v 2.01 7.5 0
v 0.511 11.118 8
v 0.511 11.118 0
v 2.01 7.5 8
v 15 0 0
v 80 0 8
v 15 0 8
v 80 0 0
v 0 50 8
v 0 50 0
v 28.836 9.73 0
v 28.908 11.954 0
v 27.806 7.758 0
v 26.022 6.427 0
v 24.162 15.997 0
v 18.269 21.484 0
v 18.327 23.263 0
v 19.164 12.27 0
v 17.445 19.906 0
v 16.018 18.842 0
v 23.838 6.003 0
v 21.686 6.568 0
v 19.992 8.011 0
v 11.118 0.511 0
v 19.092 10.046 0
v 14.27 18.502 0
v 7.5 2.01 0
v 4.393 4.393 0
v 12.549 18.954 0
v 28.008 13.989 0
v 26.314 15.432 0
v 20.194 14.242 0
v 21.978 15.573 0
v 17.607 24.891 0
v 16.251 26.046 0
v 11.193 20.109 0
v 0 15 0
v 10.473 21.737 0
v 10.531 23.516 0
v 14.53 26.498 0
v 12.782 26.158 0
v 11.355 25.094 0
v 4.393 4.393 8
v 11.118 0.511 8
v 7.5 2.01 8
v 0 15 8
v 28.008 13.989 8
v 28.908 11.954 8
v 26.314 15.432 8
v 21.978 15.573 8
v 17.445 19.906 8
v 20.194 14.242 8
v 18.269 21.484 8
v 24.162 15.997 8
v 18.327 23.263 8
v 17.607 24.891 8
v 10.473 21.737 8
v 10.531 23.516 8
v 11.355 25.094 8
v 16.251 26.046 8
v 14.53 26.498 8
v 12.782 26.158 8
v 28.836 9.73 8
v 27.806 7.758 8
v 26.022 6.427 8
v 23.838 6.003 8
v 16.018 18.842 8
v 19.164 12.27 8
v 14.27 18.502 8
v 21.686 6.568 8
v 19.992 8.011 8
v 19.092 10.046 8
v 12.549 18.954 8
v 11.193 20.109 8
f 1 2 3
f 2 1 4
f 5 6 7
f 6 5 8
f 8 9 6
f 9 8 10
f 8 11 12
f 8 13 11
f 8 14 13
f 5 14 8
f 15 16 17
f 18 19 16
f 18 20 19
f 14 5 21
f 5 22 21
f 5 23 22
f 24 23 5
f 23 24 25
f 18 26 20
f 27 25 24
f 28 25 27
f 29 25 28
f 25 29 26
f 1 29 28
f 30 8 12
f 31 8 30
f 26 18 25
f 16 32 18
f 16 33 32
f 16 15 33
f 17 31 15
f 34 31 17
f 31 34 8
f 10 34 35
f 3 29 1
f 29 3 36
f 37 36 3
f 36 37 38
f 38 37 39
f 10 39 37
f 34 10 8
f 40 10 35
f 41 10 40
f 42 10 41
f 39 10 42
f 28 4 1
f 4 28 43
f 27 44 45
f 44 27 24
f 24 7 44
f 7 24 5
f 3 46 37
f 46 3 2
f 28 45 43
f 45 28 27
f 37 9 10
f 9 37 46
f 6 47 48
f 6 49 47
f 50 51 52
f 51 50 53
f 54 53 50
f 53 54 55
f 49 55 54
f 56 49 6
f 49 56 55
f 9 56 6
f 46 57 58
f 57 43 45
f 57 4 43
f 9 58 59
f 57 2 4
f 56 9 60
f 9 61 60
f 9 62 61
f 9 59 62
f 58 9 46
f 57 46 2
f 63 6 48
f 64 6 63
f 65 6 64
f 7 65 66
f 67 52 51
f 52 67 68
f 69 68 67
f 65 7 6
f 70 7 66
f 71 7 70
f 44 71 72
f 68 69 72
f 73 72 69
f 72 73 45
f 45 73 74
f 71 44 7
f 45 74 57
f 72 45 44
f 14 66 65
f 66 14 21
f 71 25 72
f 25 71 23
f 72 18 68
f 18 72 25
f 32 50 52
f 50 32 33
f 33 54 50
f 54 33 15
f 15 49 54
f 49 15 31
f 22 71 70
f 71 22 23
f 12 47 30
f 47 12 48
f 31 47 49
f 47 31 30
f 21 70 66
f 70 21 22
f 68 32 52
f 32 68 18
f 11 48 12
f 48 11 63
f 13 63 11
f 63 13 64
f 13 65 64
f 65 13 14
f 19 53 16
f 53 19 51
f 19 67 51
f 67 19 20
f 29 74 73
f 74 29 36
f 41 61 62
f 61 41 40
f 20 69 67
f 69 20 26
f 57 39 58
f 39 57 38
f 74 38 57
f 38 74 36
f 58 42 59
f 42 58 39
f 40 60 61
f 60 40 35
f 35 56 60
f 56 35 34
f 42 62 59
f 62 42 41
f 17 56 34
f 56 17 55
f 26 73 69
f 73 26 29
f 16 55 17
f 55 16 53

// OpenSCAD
$fn = 32;

// ----------------------------------------------------------------------
// Bracket plate: corner pad 80 x 50, fillet R15
// ----------------------------------------------------------------------

// --- parameters (mm) ---
hole_r = 4;               // bolt hole radius
plate_t = 8;              // plate thickness, Z (extrusion height)
leg_a = 80;               // base leg
leg_b = 50;               // height leg
fillet_r = 15;            // right-angle fillet radius

hole_d1 = 2 * hole_r + 2;
hole_d2 = 2 * hole_r;

profile = [[15, 0], [80, 0], [0, 50], [0, 15], [0.511, 11.118], [2.01, 7.5], [4.393, 4.393], [7.5, 2.01], [11.118, 0.511]];  // primary outline, 9 points, counter clockwise
void_1 = [[28.908, 11.954], [28.008, 13.989], [26.314, 15.432], [24.162, 15.997], [21.978, 15.573], [20.194, 14.242], [19.164, 12.27], [19.092, 10.046], [19.992, 8.011], [21.686, 6.568], [23.838, 6.003], [26.022, 6.427], [27.806, 7.758], [28.836, 9.73]];  // mount hole 1, 14 points
void_2 = [[18.327, 23.263], [17.607, 24.891], [16.251, 26.046], [14.53, 26.498], [12.782, 26.158], [11.355, 25.094], [10.531, 23.516], [10.473, 21.737], [11.193, 20.109], [12.549, 18.954], [14.27, 18.502], [16.018, 18.842], [17.445, 19.906], [18.269, 21.484]];  // mount hole 2, 14 points

// --- the one profile operation ---
difference() {
  linear_extrude(height = plate_t) polygon(points = profile);
  translate([0, 0, -1])
    linear_extrude(height = plate_t + 2) polygon(points = void_1);
  translate([0, 0, -1])
    linear_extrude(height = plate_t + 2) polygon(points = void_2);
}
